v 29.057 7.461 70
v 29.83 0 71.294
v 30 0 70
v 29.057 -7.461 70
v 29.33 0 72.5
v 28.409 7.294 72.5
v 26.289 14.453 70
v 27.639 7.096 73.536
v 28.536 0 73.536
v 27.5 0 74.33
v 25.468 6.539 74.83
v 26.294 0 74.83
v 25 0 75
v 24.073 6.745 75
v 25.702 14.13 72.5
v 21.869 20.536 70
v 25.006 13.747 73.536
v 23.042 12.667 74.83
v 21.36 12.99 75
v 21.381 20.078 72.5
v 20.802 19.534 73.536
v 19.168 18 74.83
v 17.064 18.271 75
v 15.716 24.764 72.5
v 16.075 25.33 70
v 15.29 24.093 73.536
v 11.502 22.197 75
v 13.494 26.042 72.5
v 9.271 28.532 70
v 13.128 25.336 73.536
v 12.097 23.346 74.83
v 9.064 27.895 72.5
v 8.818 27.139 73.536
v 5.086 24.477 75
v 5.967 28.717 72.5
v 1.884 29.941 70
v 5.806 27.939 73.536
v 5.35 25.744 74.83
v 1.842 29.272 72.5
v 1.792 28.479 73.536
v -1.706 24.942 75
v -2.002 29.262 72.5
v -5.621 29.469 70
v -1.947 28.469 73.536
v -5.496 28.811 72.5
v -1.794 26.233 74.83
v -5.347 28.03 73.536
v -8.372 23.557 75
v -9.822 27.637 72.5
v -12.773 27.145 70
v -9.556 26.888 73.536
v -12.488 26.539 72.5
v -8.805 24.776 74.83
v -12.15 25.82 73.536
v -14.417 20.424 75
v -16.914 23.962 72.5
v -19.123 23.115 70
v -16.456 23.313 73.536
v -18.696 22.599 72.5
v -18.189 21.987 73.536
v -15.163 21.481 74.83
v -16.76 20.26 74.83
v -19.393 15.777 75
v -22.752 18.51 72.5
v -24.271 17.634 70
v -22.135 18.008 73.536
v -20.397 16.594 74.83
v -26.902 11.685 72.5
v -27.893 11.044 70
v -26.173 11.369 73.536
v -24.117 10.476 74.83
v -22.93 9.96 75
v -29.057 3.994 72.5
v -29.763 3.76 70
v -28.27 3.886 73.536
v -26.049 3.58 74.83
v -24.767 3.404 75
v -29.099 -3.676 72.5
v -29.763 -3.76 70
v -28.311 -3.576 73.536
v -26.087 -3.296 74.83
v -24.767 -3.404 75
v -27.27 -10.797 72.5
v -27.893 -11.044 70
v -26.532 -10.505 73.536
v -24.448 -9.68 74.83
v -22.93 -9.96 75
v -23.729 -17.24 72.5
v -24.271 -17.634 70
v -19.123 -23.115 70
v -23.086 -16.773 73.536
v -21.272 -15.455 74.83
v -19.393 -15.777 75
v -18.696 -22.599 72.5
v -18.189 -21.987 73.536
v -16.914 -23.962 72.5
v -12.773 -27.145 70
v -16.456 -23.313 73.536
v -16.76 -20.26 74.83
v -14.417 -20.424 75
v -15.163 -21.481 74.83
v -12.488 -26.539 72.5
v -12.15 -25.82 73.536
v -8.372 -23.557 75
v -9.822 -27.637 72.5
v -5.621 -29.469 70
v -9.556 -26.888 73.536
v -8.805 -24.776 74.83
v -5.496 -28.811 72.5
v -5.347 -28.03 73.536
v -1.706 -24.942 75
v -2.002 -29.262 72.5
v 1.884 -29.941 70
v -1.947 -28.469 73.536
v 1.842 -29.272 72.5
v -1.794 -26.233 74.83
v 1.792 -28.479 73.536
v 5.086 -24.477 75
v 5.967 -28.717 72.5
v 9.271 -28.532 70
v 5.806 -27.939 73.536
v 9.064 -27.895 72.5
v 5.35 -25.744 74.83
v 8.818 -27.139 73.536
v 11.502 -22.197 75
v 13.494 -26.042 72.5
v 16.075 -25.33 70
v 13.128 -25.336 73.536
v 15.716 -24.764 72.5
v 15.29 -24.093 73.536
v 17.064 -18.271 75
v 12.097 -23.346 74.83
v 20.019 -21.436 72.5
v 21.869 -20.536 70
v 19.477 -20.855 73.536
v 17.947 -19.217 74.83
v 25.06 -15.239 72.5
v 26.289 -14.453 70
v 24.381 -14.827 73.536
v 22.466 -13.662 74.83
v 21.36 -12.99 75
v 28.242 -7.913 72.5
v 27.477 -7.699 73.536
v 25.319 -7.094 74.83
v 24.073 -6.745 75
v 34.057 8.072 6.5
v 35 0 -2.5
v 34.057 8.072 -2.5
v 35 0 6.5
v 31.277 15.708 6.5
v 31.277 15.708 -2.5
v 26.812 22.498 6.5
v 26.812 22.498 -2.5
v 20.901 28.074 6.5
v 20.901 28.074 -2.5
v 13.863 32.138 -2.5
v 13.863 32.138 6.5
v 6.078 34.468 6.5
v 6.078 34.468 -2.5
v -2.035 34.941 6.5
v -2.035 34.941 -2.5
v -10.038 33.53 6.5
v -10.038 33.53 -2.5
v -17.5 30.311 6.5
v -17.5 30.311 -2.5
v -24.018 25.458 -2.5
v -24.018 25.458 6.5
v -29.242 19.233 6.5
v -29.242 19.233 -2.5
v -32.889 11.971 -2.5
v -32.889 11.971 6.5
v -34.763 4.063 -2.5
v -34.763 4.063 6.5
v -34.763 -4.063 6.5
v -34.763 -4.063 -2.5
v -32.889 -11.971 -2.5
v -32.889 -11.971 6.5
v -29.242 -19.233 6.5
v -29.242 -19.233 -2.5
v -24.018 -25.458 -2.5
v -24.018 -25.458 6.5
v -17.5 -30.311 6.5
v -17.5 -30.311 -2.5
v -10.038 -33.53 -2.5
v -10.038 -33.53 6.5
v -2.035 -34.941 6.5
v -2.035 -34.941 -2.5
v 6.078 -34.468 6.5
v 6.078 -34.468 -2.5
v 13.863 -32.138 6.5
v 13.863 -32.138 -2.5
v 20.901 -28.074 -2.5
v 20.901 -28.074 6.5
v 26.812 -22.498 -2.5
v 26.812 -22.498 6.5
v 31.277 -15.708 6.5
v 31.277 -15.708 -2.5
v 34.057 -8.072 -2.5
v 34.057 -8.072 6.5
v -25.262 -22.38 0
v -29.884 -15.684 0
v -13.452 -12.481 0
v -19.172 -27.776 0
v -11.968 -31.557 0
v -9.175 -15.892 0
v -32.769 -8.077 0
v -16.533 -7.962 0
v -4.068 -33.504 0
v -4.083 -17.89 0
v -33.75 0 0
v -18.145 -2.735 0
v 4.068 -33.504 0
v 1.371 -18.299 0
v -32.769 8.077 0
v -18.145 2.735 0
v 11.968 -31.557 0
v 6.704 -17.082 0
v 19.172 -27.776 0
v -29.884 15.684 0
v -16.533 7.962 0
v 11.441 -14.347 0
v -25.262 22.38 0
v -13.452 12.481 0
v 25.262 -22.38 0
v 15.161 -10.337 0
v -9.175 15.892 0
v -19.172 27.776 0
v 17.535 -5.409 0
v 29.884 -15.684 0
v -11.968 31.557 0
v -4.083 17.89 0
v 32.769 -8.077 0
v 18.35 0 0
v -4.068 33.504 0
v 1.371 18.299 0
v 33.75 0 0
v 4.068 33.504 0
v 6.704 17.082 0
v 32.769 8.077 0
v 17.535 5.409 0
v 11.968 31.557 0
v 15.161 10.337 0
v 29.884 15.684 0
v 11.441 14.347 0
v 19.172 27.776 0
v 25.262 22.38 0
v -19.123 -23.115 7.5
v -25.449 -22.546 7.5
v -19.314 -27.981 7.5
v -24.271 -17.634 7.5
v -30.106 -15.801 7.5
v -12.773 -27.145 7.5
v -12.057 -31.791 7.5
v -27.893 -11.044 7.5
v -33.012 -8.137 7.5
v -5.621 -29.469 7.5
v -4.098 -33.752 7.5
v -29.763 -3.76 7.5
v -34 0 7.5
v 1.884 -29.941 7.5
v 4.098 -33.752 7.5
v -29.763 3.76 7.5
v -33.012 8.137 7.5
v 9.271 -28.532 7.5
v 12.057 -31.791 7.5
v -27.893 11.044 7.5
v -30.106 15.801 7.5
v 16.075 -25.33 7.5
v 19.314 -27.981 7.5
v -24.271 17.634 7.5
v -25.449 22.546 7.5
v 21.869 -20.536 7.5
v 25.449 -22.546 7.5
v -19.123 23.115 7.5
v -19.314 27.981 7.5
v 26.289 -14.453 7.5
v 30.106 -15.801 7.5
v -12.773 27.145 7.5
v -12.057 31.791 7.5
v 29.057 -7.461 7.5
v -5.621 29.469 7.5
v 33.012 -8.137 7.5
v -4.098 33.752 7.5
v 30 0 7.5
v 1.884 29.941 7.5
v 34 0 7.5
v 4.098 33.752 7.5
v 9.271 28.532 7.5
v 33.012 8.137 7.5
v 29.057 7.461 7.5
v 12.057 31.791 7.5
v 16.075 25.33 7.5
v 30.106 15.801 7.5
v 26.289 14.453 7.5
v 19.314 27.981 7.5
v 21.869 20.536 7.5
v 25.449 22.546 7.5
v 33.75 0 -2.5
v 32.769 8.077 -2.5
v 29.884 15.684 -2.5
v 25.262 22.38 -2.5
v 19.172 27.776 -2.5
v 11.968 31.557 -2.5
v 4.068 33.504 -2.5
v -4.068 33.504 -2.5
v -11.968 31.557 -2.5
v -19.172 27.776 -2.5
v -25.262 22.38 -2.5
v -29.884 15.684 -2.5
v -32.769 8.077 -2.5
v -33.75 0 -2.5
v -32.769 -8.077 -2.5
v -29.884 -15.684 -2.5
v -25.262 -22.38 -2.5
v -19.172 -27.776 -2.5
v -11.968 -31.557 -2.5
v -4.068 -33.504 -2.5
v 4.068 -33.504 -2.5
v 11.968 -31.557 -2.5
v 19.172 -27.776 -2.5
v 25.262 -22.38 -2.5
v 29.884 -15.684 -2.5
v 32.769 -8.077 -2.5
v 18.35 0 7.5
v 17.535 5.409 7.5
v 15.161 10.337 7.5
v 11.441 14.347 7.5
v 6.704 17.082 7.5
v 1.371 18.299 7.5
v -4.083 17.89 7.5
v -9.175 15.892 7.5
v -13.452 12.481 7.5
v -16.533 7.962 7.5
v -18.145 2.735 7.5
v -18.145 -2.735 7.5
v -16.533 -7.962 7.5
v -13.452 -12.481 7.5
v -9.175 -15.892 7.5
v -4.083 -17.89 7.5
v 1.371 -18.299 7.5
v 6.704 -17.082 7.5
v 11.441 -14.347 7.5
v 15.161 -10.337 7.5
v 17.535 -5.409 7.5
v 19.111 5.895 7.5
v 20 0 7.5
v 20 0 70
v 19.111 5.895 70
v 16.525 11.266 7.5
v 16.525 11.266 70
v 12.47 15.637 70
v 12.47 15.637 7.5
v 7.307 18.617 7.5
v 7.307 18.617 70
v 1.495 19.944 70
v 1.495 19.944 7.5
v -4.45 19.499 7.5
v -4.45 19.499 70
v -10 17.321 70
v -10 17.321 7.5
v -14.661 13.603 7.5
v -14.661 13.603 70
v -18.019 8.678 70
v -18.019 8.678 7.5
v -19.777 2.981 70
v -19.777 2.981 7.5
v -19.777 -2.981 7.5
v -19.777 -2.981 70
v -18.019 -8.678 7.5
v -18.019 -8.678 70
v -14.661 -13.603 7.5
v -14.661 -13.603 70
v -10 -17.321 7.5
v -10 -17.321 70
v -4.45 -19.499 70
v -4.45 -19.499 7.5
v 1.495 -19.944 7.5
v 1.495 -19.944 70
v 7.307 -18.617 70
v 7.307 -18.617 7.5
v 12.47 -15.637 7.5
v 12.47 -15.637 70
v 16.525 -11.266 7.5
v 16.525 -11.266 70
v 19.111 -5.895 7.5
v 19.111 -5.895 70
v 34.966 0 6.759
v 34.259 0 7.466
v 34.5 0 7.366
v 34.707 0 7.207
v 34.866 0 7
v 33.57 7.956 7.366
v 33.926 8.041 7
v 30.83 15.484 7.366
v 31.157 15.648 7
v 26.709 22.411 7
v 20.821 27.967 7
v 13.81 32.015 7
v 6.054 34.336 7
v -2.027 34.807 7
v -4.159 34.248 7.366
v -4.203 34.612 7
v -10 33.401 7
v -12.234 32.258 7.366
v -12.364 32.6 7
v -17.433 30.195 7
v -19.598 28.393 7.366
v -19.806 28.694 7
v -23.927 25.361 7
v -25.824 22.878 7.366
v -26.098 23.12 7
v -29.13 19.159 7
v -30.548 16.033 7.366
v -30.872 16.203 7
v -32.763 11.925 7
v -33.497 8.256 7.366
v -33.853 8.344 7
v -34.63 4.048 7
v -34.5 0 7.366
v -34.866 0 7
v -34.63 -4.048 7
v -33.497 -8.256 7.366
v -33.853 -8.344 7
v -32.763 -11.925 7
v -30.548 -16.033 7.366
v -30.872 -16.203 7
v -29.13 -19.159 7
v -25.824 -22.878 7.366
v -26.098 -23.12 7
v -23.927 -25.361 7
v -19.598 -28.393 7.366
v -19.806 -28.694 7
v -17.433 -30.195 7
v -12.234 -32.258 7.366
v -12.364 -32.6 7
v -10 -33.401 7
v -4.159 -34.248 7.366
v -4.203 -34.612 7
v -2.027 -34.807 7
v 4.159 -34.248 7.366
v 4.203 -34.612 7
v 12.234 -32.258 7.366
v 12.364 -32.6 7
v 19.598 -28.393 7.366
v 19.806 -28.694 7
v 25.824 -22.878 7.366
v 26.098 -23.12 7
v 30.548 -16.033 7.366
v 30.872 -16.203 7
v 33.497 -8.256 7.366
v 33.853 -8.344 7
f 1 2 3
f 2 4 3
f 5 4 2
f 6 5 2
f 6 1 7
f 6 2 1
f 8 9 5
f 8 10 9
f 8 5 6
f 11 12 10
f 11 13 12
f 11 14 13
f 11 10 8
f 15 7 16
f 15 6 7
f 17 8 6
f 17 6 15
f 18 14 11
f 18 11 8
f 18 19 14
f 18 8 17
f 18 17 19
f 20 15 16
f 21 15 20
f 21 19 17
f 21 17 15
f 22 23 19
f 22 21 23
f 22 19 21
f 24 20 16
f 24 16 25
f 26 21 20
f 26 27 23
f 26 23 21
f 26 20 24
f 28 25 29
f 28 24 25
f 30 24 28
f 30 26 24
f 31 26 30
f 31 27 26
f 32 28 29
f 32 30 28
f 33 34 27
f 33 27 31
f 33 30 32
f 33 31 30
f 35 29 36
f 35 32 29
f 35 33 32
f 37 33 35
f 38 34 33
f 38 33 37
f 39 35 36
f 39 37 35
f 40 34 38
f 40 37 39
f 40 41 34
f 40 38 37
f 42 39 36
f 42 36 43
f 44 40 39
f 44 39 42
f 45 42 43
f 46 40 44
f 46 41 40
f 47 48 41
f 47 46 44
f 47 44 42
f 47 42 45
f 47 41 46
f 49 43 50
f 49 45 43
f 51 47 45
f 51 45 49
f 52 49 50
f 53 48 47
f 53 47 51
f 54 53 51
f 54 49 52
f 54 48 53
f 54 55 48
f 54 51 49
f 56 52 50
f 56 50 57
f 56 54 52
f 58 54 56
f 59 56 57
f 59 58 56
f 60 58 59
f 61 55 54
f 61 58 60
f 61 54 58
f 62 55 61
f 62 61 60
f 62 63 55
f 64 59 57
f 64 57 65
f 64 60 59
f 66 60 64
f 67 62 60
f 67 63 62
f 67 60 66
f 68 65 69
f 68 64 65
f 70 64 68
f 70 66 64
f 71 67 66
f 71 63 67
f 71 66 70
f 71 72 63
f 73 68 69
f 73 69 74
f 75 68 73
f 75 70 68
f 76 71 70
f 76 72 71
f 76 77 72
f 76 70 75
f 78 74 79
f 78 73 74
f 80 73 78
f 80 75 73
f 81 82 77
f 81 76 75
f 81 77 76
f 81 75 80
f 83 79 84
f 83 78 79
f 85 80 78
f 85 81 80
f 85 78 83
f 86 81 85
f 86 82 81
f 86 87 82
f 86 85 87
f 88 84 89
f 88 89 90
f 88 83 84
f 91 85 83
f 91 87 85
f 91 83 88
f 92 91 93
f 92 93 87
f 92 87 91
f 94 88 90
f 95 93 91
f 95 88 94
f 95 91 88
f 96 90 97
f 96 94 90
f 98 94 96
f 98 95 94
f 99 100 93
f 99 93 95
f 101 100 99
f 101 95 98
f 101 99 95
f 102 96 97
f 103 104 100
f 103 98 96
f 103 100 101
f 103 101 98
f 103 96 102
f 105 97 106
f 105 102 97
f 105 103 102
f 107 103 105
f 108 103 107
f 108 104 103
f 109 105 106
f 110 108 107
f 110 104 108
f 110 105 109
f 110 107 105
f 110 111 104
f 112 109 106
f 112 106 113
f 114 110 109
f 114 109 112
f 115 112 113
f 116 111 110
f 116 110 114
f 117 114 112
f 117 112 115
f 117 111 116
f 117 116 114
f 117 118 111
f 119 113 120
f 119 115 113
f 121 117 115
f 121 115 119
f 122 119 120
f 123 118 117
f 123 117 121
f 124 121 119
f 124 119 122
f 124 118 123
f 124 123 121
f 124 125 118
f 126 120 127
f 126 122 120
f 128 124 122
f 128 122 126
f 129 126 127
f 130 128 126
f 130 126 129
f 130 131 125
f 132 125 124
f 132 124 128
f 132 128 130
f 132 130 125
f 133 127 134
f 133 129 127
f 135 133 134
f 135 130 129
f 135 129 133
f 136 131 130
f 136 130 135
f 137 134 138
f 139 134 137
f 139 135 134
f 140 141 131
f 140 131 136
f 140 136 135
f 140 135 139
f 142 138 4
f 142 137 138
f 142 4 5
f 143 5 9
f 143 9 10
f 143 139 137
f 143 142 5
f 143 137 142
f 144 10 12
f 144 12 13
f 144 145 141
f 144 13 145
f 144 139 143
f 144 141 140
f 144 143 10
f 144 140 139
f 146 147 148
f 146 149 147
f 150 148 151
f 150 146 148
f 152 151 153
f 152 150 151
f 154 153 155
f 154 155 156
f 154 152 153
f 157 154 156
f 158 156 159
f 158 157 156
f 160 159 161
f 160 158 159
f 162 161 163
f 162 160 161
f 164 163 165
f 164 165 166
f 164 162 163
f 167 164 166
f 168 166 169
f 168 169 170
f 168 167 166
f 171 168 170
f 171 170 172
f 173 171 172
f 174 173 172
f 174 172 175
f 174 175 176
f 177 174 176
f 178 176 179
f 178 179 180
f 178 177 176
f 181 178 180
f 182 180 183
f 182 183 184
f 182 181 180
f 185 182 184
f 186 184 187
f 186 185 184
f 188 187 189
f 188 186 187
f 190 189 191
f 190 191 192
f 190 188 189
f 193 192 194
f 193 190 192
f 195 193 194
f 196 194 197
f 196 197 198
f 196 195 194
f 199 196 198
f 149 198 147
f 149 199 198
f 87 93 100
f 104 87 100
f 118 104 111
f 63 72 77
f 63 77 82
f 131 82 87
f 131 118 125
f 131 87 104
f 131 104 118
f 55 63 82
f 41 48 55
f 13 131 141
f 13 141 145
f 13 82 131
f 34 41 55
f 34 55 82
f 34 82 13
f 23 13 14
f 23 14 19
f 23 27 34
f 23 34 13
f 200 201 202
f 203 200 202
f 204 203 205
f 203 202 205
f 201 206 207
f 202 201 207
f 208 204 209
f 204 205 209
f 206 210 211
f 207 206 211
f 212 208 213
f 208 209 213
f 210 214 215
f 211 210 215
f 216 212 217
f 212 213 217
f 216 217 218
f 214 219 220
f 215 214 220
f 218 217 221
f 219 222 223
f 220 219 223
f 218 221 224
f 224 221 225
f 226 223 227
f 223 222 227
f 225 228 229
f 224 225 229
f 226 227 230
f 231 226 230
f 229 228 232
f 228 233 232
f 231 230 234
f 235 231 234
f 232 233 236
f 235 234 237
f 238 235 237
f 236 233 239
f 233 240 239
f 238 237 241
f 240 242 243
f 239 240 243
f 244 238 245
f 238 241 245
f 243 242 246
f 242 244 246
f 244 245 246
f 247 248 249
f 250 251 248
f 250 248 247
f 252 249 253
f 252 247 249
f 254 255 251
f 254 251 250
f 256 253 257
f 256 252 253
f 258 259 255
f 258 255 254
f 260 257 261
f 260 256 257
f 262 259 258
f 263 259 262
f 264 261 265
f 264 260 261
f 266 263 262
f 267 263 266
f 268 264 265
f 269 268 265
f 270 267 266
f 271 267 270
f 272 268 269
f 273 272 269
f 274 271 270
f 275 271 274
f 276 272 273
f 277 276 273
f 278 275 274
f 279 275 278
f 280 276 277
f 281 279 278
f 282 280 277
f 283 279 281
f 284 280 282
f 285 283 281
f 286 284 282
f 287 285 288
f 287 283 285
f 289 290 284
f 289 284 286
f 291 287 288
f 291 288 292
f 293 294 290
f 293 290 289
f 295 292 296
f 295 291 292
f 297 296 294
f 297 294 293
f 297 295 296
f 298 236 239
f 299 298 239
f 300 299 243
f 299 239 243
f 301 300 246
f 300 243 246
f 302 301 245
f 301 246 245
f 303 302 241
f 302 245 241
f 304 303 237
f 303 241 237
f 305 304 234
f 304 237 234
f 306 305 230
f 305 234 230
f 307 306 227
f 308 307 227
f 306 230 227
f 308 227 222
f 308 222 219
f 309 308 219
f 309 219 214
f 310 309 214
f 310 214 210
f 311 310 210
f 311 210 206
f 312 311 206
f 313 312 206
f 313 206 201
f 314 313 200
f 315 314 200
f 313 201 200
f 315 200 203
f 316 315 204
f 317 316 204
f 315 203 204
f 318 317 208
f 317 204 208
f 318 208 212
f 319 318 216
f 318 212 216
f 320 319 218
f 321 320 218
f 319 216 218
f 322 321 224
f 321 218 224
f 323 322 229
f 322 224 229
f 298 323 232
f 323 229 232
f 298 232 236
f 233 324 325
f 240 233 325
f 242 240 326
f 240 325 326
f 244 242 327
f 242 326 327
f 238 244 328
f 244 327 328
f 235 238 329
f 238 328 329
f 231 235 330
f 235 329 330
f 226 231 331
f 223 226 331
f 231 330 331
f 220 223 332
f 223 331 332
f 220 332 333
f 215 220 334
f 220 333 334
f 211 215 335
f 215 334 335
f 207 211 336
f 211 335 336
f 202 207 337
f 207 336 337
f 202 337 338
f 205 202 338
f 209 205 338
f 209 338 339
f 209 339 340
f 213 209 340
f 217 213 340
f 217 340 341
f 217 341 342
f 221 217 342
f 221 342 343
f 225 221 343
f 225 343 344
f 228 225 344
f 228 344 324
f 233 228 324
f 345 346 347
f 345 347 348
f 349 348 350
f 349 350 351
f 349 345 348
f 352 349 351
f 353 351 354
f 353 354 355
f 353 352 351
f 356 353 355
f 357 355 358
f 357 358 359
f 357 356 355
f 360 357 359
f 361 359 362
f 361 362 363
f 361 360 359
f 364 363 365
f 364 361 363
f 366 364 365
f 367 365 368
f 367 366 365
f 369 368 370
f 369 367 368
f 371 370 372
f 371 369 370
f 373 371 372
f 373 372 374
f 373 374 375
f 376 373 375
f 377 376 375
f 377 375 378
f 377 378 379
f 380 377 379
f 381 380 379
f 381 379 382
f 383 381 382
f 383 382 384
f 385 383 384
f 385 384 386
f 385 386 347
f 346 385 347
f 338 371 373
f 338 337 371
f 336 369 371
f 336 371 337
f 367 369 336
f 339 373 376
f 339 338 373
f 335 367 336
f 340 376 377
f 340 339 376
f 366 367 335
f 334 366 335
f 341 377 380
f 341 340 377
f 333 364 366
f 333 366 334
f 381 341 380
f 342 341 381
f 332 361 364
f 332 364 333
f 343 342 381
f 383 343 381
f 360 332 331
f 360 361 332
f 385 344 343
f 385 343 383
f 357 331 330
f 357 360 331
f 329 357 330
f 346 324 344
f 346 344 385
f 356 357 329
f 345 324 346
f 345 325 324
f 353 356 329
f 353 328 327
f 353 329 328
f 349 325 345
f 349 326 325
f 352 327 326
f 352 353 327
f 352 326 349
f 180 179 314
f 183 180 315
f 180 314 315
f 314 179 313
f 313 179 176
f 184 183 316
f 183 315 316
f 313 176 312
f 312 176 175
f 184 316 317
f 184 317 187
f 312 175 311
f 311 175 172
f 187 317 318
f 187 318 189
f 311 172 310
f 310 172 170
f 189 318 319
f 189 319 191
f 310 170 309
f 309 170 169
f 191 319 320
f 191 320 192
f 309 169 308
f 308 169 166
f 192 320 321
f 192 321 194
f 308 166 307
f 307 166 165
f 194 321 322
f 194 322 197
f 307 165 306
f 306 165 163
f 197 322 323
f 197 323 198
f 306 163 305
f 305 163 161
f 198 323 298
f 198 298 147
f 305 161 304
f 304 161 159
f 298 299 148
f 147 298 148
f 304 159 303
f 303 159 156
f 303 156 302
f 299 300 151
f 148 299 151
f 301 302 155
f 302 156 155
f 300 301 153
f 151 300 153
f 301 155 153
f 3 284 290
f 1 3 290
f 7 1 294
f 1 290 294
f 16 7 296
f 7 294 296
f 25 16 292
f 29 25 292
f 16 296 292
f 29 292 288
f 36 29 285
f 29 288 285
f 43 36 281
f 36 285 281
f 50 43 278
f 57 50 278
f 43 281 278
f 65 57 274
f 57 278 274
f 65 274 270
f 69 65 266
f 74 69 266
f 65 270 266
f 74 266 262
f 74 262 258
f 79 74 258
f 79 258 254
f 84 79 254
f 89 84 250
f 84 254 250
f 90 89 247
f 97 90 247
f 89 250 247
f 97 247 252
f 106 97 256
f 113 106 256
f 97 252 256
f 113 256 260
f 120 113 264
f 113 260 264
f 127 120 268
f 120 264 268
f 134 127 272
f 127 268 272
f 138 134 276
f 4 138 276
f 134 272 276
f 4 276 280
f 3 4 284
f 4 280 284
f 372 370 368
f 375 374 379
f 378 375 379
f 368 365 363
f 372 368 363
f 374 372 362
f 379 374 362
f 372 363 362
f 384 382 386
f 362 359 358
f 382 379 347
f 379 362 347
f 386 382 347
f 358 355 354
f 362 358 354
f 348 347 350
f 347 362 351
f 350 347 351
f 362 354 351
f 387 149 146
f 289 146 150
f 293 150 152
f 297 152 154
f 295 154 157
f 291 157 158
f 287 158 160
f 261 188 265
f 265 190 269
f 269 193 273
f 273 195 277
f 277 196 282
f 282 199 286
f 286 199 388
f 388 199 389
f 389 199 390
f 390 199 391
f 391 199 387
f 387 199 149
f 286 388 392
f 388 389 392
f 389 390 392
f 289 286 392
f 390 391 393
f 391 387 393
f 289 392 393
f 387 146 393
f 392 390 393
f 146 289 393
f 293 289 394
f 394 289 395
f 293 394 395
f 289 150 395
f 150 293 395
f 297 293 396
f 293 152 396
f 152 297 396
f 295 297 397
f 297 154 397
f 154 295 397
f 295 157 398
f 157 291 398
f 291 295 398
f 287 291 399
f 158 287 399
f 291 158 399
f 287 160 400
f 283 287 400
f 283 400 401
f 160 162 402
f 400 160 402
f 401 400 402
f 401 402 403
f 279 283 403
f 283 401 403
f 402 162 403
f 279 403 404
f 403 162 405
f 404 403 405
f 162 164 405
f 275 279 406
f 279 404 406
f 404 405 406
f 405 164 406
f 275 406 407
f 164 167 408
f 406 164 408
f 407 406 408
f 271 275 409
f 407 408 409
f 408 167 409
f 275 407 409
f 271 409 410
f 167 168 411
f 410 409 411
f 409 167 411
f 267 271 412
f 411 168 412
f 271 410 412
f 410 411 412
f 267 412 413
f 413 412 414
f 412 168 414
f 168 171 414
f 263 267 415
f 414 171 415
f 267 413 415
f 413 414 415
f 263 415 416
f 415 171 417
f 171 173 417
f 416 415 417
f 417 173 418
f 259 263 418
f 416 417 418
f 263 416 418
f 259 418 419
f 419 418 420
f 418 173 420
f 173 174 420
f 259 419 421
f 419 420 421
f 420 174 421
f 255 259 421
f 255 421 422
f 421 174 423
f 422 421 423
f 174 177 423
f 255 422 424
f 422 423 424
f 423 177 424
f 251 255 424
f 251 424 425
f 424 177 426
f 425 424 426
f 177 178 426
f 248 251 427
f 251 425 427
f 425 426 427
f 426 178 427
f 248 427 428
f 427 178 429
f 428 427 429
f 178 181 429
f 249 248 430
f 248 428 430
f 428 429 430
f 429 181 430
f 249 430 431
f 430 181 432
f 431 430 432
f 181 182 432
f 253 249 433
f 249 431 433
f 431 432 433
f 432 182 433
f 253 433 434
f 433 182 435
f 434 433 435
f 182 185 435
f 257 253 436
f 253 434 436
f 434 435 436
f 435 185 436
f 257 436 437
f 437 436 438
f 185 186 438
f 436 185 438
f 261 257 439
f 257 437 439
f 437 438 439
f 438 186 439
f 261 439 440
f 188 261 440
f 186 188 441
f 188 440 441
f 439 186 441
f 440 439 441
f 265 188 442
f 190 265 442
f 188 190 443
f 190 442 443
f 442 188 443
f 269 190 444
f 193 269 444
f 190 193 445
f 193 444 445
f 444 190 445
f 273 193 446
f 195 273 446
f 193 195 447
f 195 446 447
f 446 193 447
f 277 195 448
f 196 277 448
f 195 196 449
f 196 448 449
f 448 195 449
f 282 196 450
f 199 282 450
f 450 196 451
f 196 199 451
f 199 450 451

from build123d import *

# Parameters (mm, degrees)
F0_R        = 35
F1_DEPTH    = 7.5
F2_R        = 18.35
F3_DEPTH    = 25
F5_R        = 30
F5_R_2      = 20
F6_DEPTH    = 67.5
F7_R        = 5
F8_START    = 62.5
F6_FACE_R   = 20
F6_FACE_R_2 = 18.35
F8_DEPTH    = 5
F9_R        = 1
F11_R       = 18.35
F12_DEPTH   = 5
F13_R       = 35
F13_R_2     = 33.75
F14_DEPTH   = 2.5


with BuildPart() as f1:
    # F0 (on Top) → F1 (new body)
    with BuildSketch(Plane.XY):
        Circle(F0_R)
    extrude(amount=F1_DEPTH)

    # F2 (on face) → F3 (cut)
    with BuildSketch(Plane.XY.offset(7.5)):
        Circle(F2_R)
    extrude(amount=-F3_DEPTH, mode=Mode.SUBTRACT)

    # F5 (on face) → F6 (join)
    with BuildSketch(Plane.XY.offset(7.5)):
        Circle(F5_R)
        Circle(F5_R_2, mode=Mode.SUBTRACT)
    extrude(amount=F6_DEPTH)

    # F7
    f7_edges = [f1.edges().sort_by_distance(p)[0] for p in [
        (-30, 0, 75),
    ]]
    fillet(f7_edges, radius=F7_R)

    # F6_face (on face) → F8 (join)
    with BuildSketch(Plane.XY.offset(7.5).offset(F8_START)):
        Circle(F6_FACE_R)
        Circle(F6_FACE_R_2, mode=Mode.SUBTRACT)
    extrude(amount=F8_DEPTH)

    # F9
    f9_edges = [f1.edges().sort_by_distance(p)[0] for p in [
        (-35, 0, 7.5),
    ]]
    fillet(f9_edges, radius=F9_R)

    # F11 (on offset) → F12 (join)
    with BuildSketch(Plane.XY.offset(75)):
        Circle(F11_R)
    extrude(amount=-F12_DEPTH)

    # F13 (on face) → F14 (join)
    with BuildSketch(Plane.XY):
        Circle(F13_R)
        Circle(F13_R_2, mode=Mode.SUBTRACT)
    extrude(amount=-F14_DEPTH)


solid = f1.part
